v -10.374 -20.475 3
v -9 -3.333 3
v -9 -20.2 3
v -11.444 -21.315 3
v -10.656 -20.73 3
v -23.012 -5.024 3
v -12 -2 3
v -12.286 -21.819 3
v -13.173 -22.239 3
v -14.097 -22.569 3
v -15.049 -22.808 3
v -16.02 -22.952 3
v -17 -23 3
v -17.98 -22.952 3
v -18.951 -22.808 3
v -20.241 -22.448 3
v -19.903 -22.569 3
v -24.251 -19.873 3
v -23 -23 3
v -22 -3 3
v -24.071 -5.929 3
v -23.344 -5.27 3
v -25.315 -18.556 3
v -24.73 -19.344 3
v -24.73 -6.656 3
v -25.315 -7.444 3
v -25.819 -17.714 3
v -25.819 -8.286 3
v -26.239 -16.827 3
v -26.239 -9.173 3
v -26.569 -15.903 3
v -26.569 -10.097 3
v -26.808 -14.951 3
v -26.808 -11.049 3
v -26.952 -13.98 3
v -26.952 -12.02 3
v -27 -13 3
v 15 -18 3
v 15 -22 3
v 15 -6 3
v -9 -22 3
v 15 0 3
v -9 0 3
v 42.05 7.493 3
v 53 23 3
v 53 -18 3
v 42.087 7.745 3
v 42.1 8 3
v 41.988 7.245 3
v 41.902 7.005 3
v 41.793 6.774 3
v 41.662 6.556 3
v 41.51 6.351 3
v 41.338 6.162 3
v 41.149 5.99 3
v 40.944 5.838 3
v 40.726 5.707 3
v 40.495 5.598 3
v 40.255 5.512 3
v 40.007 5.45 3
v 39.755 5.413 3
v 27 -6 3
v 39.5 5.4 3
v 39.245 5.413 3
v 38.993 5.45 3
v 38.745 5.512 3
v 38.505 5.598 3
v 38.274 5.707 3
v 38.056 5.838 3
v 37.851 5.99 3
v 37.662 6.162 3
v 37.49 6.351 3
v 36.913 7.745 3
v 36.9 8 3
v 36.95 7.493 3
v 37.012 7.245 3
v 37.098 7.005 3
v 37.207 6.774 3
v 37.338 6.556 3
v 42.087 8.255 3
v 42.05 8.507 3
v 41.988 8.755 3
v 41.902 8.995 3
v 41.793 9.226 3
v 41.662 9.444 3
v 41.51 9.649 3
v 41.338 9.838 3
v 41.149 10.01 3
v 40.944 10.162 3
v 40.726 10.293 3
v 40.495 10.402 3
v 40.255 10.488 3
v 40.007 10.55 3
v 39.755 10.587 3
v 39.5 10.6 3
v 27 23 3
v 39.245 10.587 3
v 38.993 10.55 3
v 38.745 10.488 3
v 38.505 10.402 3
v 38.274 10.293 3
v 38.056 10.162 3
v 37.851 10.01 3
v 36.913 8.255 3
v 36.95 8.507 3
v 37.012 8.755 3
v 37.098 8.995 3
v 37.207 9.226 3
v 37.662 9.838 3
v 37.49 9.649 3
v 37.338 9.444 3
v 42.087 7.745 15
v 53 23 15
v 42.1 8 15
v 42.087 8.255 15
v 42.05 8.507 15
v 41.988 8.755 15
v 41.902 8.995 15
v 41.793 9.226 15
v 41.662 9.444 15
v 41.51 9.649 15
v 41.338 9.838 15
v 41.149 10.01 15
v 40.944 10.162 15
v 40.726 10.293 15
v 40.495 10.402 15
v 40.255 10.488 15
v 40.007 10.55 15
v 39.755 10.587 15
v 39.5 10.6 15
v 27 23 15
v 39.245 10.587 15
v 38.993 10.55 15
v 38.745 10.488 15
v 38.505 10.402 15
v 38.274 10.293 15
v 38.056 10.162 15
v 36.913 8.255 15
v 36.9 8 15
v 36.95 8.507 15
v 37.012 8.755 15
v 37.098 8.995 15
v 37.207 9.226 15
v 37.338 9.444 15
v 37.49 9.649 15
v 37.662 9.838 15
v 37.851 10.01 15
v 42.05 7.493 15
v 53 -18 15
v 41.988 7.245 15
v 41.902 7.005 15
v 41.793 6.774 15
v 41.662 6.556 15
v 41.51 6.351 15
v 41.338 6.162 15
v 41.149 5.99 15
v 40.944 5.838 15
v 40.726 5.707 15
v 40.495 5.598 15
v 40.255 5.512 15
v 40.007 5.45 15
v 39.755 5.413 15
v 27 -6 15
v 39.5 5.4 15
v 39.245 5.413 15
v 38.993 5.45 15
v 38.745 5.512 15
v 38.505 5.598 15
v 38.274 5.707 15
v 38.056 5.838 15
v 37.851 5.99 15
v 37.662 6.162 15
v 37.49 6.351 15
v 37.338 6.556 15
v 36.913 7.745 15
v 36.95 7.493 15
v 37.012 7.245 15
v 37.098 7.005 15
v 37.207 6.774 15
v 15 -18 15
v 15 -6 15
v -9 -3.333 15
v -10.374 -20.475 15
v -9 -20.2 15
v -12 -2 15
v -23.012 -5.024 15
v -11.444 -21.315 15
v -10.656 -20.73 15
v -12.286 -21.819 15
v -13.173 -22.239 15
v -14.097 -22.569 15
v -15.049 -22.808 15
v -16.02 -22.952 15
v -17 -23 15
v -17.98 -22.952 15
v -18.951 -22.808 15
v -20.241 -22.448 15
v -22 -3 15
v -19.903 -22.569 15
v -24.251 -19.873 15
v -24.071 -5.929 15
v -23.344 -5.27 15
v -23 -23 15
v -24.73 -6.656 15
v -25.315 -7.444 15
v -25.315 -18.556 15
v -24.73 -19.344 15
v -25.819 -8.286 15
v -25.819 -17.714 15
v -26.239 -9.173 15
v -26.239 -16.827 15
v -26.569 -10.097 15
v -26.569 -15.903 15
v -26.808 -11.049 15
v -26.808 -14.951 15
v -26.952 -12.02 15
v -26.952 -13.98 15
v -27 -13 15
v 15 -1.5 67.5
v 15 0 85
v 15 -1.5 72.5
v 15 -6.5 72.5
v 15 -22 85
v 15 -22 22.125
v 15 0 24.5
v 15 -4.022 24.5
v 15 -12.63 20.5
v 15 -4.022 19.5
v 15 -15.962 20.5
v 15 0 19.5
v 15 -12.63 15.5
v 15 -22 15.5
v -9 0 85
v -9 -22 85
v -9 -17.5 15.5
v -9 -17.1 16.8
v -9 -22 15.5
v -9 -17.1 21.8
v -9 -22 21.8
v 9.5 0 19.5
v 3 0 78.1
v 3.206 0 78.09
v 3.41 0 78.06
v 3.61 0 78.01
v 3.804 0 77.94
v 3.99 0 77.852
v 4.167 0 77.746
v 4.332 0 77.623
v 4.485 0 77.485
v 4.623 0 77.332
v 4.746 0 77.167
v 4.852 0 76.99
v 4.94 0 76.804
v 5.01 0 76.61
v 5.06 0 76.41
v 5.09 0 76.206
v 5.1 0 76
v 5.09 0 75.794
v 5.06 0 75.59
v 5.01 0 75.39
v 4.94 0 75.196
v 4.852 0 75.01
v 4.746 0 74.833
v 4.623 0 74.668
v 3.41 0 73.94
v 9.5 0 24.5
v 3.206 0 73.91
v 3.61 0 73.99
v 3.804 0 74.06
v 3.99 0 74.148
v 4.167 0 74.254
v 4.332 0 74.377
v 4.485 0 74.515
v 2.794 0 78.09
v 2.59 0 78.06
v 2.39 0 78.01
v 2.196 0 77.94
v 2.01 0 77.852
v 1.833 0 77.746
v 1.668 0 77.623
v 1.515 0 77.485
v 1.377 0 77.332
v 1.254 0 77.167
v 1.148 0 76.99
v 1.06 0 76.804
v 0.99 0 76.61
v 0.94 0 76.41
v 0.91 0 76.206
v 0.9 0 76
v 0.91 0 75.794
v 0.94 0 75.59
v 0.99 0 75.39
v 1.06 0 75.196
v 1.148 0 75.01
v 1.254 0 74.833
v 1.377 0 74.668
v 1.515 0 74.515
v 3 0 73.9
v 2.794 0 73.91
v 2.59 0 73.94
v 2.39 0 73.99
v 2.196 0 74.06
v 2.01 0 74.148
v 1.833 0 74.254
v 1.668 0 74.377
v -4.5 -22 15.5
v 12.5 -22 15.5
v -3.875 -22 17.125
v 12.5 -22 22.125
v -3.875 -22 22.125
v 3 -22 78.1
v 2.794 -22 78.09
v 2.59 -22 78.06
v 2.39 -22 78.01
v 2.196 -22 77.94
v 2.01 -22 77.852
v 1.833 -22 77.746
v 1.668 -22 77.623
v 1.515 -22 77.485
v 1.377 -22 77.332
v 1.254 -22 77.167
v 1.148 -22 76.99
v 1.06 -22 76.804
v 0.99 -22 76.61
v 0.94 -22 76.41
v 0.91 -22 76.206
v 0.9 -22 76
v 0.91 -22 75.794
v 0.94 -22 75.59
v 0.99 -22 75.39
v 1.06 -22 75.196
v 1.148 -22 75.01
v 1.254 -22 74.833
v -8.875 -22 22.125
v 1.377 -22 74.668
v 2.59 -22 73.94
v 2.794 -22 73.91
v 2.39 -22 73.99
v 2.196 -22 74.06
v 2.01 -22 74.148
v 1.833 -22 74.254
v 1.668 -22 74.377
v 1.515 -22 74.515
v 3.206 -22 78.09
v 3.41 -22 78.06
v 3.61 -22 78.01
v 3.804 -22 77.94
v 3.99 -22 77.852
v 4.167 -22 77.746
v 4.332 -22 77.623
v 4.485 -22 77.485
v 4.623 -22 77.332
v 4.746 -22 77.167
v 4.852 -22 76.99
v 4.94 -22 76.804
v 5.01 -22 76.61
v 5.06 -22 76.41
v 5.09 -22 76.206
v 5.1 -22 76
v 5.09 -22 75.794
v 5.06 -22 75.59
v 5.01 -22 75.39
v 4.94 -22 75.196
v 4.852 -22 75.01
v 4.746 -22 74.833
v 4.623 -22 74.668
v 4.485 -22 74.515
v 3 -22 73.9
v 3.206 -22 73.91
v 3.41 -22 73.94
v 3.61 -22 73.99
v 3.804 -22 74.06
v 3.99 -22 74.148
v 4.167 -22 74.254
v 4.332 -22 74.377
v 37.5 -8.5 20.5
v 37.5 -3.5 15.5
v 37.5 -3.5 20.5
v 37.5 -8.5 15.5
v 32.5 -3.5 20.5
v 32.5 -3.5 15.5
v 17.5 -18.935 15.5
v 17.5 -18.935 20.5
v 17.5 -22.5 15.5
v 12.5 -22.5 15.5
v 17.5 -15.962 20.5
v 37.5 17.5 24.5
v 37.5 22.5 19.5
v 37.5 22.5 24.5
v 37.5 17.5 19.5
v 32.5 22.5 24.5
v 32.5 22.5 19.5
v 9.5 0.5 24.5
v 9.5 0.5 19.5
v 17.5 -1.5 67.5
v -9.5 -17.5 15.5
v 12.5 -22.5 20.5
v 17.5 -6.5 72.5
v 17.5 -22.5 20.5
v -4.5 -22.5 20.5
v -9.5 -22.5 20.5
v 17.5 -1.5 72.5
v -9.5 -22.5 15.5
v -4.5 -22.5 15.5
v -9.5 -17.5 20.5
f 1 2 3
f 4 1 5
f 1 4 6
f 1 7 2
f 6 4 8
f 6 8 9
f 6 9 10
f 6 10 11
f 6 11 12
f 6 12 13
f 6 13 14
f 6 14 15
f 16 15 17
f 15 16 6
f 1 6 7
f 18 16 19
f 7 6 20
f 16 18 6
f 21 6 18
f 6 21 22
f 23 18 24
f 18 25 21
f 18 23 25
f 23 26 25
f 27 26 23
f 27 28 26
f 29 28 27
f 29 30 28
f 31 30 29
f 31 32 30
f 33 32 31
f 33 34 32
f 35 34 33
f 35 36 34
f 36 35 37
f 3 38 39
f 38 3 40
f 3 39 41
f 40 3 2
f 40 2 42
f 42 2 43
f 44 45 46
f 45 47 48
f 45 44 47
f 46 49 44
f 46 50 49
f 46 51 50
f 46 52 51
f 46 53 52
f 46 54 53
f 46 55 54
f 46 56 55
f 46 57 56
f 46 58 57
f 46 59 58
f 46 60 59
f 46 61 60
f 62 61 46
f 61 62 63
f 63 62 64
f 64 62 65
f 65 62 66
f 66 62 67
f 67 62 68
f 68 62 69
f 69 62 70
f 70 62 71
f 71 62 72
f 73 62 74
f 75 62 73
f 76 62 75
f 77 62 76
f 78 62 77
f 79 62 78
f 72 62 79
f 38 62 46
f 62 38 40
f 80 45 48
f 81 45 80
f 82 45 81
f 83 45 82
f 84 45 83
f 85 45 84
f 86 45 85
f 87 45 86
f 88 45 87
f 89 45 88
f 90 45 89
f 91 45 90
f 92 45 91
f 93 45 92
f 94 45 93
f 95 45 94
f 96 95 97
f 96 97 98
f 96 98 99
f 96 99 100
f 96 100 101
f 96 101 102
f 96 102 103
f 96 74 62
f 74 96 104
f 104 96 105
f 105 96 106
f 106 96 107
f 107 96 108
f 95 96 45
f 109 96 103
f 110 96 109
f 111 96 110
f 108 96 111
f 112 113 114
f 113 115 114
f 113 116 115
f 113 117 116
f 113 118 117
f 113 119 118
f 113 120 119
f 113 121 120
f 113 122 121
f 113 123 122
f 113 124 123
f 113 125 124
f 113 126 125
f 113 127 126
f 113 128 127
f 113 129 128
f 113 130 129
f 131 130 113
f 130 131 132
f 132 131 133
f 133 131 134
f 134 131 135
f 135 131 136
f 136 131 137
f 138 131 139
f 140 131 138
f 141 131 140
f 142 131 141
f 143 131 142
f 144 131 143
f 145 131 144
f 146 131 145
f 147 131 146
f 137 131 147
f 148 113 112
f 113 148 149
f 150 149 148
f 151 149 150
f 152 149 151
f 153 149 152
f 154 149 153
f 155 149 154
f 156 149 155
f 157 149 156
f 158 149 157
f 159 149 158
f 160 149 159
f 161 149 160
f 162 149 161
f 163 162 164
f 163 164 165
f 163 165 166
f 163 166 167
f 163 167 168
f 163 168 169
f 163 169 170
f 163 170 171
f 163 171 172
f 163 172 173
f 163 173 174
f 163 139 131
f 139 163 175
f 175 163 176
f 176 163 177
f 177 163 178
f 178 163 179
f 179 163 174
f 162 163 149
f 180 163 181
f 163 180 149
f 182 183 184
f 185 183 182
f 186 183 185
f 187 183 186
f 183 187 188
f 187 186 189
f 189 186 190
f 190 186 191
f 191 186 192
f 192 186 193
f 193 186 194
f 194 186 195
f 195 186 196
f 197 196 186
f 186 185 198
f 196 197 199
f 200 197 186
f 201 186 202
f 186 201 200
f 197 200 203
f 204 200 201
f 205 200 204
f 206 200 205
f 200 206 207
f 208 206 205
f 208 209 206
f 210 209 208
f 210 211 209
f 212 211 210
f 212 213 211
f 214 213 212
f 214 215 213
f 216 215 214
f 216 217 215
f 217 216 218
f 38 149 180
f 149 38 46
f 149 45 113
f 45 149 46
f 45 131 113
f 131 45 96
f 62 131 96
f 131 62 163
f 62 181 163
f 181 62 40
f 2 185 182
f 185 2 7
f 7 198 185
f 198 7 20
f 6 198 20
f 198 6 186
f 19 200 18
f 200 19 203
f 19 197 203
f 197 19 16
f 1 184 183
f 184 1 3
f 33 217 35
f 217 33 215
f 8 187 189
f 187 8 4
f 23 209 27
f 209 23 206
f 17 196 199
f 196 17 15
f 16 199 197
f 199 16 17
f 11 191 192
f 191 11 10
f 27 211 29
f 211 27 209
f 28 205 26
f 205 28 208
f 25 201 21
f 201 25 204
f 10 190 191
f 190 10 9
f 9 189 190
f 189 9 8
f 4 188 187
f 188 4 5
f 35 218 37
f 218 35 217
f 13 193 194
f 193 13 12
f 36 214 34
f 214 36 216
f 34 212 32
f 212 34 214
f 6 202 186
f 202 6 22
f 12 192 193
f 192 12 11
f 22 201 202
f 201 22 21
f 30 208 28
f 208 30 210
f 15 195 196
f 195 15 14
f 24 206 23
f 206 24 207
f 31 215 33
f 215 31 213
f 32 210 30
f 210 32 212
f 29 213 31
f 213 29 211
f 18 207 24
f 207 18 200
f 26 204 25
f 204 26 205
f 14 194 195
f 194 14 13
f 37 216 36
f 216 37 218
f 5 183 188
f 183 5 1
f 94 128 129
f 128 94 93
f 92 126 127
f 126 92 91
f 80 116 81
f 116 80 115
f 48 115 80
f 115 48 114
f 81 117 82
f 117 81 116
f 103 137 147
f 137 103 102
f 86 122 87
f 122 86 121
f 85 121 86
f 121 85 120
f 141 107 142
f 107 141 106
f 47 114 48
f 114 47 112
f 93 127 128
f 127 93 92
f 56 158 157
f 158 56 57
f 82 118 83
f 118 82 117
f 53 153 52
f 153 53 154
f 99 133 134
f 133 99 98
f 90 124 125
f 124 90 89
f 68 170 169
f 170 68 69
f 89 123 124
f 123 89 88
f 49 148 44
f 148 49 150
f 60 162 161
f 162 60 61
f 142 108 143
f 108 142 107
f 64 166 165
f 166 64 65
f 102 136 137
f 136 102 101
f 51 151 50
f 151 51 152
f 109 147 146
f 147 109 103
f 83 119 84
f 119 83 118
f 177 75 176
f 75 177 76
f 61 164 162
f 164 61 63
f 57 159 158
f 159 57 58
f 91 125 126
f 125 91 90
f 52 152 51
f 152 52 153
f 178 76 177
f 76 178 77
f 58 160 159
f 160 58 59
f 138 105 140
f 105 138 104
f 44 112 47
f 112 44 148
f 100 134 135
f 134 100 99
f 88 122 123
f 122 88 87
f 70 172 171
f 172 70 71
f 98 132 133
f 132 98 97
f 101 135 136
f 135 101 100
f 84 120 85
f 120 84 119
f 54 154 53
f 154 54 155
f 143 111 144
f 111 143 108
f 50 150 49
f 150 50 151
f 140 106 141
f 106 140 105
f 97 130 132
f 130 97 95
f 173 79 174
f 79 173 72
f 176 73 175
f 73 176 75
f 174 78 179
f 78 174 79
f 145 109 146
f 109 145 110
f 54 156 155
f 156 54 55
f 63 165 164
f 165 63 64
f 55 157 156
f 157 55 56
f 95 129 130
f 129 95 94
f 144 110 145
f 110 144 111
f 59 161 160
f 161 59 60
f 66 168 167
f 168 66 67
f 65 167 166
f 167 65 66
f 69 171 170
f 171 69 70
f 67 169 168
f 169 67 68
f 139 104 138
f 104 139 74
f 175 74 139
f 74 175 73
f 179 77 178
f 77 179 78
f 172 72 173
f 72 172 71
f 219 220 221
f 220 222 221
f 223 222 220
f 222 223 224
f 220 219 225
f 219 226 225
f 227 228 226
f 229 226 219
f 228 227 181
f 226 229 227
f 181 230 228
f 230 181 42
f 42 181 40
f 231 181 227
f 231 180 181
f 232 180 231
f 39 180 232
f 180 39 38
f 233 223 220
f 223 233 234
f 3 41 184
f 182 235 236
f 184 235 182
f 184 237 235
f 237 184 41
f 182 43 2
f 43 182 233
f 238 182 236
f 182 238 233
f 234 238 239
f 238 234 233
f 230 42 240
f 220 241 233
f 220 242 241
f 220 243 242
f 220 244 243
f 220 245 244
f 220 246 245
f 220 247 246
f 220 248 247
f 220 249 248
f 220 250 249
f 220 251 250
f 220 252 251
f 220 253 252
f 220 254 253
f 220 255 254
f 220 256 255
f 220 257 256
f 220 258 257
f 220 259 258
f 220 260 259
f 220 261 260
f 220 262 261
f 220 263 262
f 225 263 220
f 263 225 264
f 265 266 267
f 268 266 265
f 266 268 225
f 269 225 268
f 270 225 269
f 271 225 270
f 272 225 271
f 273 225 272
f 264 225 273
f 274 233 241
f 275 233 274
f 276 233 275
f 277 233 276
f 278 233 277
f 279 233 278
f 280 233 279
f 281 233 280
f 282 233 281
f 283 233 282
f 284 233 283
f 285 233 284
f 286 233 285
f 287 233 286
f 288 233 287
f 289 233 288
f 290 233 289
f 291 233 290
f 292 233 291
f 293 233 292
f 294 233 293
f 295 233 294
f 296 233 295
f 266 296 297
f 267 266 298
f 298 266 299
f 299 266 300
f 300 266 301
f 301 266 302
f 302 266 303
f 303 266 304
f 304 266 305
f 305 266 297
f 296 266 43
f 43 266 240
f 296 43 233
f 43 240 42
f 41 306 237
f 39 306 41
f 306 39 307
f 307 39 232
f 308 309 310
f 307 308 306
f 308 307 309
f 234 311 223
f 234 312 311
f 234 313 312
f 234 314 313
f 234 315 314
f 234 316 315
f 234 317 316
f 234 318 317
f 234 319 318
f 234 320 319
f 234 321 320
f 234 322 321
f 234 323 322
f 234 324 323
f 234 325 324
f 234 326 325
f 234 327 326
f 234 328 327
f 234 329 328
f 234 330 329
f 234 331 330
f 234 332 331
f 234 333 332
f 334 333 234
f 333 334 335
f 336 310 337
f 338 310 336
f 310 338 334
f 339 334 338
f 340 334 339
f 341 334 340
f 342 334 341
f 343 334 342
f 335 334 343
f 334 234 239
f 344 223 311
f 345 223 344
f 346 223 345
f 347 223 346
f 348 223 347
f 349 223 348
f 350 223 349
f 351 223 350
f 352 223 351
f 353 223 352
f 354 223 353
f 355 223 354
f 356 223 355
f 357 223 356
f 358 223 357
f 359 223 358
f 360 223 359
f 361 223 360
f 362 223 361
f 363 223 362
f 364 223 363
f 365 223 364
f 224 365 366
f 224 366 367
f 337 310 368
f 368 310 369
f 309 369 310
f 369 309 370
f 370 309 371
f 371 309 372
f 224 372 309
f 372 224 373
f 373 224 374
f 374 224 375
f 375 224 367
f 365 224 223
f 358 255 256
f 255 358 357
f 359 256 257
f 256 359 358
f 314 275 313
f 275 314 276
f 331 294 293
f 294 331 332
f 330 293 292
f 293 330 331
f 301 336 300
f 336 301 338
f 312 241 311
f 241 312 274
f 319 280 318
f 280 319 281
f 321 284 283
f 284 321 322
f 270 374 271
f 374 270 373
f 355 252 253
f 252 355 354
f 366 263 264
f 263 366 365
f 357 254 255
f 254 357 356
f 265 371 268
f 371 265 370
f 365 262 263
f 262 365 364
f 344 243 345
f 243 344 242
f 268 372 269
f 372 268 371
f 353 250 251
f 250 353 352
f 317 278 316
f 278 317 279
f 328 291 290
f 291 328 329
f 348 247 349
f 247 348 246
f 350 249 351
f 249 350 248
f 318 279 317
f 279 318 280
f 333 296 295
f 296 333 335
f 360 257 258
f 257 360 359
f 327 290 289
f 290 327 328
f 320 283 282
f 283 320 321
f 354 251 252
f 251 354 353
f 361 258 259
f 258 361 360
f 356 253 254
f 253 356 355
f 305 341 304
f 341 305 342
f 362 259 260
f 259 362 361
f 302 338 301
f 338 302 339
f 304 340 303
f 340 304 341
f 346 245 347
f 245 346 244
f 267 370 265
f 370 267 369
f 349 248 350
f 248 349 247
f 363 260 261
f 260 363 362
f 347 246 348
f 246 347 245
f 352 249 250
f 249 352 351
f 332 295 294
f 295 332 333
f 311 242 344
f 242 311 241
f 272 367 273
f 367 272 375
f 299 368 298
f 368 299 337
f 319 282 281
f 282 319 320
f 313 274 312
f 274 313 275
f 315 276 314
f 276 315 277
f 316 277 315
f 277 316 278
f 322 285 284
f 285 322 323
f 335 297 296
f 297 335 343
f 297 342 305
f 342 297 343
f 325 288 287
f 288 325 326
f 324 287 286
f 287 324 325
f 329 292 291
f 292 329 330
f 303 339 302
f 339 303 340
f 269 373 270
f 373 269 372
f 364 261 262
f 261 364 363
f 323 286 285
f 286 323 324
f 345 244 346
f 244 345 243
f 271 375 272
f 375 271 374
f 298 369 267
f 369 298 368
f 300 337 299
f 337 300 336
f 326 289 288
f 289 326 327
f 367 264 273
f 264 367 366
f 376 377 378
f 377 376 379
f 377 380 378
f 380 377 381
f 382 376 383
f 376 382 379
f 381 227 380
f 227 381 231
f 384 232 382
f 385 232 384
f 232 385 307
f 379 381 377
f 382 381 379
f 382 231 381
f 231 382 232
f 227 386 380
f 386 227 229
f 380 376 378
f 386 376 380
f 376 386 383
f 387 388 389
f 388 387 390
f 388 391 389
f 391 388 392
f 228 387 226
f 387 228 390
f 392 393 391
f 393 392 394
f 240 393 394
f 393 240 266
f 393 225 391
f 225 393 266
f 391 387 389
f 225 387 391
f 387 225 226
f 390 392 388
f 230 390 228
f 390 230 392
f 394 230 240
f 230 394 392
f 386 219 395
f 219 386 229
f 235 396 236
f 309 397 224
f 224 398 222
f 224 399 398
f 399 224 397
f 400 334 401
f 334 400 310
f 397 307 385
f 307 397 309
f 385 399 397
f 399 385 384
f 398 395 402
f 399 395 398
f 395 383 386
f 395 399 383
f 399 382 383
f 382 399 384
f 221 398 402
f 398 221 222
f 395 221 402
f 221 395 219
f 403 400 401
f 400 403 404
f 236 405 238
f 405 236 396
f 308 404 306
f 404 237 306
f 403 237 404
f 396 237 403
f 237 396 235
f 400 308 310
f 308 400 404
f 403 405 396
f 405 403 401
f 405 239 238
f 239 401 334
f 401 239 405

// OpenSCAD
// Support_Cam_PI_IR_Cut_CR6_v3.scad
// Connected parametric CR-6 Pi IR-cut camera support brackets.
//
// v3 is rebuilt as assembled parts: each side starts from one continuous
// footprint, then overlaps the upright tower and ribs into that footprint so the
// exported model is a connected printable bracket.  The original STLs were used
// only for measurements and bounding-box checks; no STL is imported here.

/* [Bracket Selection] */
bracket = "Right"; // [Right, Left, Both]

/* [Core Dimensions] */
base_z = 3;
base_thickness = 12;
left_base_z = 0;
tower_height = 82;
tower_width = 24;
tower_depth = 22;
tower_hole_diameter = 4.2;
camera_hole_diameter = 5.2;
brace_width = 5;
$fn = 64;

/* [Preview] */
both_spacing = 20; // [0:1:120]
preview_colors = true;

module maybe_color(name) {
    if (preview_colors && name == "Right") color("lightsteelblue") children();
    else if (preview_colors && name == "Left") color("palegreen") children();
    else children();
}

module extruded_footprint(points, z0, height) {
    translate([0, 0, z0])
        linear_extrude(height = height)
            polygon(points = points);
}

module through_z_hole(xy, z0, height, diameter) {
    translate([xy[0], xy[1], z0 - 0.5])
        cylinder(h = height + 1, d = diameter);
}

module tower_with_hole(origin, height, hole_y, hole_z) {
    difference() {
        translate(origin) cube([tower_width, tower_depth, height]);
        translate([origin[0] + tower_width / 2, hole_y, hole_z])
            rotate([90, 0, 0])
                cylinder(h = tower_depth + 3, d = tower_hole_diameter, center = true);
    }
}

module diagonal_strut(a, b, size = brace_width) {
    hull() {
        translate(a) cube([size, size, size], center = true);
        translate(b) cube([size, size, size], center = true);
    }
}

module right_base() {
    // One continuous top-view footprint: clamp lobe -> lower arm -> camera tab -> tower pad.
    difference() {
        union() {
            extruded_footprint([
                [-27, -13], [-23, -23], [-8, -20], [15, -18],
                [53, -18], [53, 23], [27, 23], [27, -6],
                [-3, -6], [-12, -2], [-22, -3]
            ], base_z, base_thickness);
            translate([-17, -13, base_z]) cylinder(h = base_thickness, d = 20);
        }
        through_z_hole([39.5, 8], base_z, base_thickness, camera_hole_diameter);
    }
}

module right_bracket_raw() {
    union() {
        right_base();

        // Tower overlaps the base footprint from z=3 upward, making one assembled solid.
        tower_with_hole([-9, -22, base_z], tower_height, -11, 76);

        // Connected triangular/diagonal braces from tower into the base and camera tab.
        diagonal_strut([12, -18, 18], [35, -6, 18], brace_width);
        diagonal_strut([12, -2, 22], [35, 20, 22], brace_width);
        diagonal_strut([15, -20, 18], [15, -4, 70], brace_width);
        diagonal_strut([-7, -20, 18], [13, -4, 70], brace_width);
    }
}

module left_base() {
    // One continuous top-view footprint: tower pad -> diagonal arm -> camera tab.
    difference() {
        extruded_footprint([
            [-18, 8], [-9, -1], [33, 40], [82, 40],
            [82, 60], [50, 60], [48, 56], [28, 56],
            [-13, 18]
        ], left_base_z, base_thickness);
        through_z_hole([64, 51], left_base_z, base_thickness, camera_hole_diameter);
    }
}

module left_bracket_raw() {
    union() {
        left_base();

        // Tower overlaps the diagonal base pad, keeping the left bracket assembled.
        tower_with_hole([-17, 2, left_base_z], tower_height, 13, 73);

        // Connected ribs tying the tower to the diagonal arm and camera tab.
        diagonal_strut([6, 4, 15], [30, 42, 15], brace_width);
        diagonal_strut([6, 22, 15], [50, 56, 15], brace_width);
        diagonal_strut([6, 4, 18], [6, 22, 70], brace_width);
        diagonal_strut([-15, 4, 18], [5, 22, 70], brace_width);
    }
}

module right_bracket() { maybe_color("Right") right_bracket_raw(); }
module left_bracket() { maybe_color("Left") left_bracket_raw(); }

module selected_bracket() {
    if (bracket == "Right") right_bracket();
    else if (bracket == "Left") left_bracket();
    else if (bracket == "Both") {
        translate([-65 - both_spacing / 2, 0, 0]) right_bracket();
        translate([35 + both_spacing / 2, 0, 0]) left_bracket();
    } else echo(str("Unknown bracket option: ", bracket));
}

selected_bracket();
